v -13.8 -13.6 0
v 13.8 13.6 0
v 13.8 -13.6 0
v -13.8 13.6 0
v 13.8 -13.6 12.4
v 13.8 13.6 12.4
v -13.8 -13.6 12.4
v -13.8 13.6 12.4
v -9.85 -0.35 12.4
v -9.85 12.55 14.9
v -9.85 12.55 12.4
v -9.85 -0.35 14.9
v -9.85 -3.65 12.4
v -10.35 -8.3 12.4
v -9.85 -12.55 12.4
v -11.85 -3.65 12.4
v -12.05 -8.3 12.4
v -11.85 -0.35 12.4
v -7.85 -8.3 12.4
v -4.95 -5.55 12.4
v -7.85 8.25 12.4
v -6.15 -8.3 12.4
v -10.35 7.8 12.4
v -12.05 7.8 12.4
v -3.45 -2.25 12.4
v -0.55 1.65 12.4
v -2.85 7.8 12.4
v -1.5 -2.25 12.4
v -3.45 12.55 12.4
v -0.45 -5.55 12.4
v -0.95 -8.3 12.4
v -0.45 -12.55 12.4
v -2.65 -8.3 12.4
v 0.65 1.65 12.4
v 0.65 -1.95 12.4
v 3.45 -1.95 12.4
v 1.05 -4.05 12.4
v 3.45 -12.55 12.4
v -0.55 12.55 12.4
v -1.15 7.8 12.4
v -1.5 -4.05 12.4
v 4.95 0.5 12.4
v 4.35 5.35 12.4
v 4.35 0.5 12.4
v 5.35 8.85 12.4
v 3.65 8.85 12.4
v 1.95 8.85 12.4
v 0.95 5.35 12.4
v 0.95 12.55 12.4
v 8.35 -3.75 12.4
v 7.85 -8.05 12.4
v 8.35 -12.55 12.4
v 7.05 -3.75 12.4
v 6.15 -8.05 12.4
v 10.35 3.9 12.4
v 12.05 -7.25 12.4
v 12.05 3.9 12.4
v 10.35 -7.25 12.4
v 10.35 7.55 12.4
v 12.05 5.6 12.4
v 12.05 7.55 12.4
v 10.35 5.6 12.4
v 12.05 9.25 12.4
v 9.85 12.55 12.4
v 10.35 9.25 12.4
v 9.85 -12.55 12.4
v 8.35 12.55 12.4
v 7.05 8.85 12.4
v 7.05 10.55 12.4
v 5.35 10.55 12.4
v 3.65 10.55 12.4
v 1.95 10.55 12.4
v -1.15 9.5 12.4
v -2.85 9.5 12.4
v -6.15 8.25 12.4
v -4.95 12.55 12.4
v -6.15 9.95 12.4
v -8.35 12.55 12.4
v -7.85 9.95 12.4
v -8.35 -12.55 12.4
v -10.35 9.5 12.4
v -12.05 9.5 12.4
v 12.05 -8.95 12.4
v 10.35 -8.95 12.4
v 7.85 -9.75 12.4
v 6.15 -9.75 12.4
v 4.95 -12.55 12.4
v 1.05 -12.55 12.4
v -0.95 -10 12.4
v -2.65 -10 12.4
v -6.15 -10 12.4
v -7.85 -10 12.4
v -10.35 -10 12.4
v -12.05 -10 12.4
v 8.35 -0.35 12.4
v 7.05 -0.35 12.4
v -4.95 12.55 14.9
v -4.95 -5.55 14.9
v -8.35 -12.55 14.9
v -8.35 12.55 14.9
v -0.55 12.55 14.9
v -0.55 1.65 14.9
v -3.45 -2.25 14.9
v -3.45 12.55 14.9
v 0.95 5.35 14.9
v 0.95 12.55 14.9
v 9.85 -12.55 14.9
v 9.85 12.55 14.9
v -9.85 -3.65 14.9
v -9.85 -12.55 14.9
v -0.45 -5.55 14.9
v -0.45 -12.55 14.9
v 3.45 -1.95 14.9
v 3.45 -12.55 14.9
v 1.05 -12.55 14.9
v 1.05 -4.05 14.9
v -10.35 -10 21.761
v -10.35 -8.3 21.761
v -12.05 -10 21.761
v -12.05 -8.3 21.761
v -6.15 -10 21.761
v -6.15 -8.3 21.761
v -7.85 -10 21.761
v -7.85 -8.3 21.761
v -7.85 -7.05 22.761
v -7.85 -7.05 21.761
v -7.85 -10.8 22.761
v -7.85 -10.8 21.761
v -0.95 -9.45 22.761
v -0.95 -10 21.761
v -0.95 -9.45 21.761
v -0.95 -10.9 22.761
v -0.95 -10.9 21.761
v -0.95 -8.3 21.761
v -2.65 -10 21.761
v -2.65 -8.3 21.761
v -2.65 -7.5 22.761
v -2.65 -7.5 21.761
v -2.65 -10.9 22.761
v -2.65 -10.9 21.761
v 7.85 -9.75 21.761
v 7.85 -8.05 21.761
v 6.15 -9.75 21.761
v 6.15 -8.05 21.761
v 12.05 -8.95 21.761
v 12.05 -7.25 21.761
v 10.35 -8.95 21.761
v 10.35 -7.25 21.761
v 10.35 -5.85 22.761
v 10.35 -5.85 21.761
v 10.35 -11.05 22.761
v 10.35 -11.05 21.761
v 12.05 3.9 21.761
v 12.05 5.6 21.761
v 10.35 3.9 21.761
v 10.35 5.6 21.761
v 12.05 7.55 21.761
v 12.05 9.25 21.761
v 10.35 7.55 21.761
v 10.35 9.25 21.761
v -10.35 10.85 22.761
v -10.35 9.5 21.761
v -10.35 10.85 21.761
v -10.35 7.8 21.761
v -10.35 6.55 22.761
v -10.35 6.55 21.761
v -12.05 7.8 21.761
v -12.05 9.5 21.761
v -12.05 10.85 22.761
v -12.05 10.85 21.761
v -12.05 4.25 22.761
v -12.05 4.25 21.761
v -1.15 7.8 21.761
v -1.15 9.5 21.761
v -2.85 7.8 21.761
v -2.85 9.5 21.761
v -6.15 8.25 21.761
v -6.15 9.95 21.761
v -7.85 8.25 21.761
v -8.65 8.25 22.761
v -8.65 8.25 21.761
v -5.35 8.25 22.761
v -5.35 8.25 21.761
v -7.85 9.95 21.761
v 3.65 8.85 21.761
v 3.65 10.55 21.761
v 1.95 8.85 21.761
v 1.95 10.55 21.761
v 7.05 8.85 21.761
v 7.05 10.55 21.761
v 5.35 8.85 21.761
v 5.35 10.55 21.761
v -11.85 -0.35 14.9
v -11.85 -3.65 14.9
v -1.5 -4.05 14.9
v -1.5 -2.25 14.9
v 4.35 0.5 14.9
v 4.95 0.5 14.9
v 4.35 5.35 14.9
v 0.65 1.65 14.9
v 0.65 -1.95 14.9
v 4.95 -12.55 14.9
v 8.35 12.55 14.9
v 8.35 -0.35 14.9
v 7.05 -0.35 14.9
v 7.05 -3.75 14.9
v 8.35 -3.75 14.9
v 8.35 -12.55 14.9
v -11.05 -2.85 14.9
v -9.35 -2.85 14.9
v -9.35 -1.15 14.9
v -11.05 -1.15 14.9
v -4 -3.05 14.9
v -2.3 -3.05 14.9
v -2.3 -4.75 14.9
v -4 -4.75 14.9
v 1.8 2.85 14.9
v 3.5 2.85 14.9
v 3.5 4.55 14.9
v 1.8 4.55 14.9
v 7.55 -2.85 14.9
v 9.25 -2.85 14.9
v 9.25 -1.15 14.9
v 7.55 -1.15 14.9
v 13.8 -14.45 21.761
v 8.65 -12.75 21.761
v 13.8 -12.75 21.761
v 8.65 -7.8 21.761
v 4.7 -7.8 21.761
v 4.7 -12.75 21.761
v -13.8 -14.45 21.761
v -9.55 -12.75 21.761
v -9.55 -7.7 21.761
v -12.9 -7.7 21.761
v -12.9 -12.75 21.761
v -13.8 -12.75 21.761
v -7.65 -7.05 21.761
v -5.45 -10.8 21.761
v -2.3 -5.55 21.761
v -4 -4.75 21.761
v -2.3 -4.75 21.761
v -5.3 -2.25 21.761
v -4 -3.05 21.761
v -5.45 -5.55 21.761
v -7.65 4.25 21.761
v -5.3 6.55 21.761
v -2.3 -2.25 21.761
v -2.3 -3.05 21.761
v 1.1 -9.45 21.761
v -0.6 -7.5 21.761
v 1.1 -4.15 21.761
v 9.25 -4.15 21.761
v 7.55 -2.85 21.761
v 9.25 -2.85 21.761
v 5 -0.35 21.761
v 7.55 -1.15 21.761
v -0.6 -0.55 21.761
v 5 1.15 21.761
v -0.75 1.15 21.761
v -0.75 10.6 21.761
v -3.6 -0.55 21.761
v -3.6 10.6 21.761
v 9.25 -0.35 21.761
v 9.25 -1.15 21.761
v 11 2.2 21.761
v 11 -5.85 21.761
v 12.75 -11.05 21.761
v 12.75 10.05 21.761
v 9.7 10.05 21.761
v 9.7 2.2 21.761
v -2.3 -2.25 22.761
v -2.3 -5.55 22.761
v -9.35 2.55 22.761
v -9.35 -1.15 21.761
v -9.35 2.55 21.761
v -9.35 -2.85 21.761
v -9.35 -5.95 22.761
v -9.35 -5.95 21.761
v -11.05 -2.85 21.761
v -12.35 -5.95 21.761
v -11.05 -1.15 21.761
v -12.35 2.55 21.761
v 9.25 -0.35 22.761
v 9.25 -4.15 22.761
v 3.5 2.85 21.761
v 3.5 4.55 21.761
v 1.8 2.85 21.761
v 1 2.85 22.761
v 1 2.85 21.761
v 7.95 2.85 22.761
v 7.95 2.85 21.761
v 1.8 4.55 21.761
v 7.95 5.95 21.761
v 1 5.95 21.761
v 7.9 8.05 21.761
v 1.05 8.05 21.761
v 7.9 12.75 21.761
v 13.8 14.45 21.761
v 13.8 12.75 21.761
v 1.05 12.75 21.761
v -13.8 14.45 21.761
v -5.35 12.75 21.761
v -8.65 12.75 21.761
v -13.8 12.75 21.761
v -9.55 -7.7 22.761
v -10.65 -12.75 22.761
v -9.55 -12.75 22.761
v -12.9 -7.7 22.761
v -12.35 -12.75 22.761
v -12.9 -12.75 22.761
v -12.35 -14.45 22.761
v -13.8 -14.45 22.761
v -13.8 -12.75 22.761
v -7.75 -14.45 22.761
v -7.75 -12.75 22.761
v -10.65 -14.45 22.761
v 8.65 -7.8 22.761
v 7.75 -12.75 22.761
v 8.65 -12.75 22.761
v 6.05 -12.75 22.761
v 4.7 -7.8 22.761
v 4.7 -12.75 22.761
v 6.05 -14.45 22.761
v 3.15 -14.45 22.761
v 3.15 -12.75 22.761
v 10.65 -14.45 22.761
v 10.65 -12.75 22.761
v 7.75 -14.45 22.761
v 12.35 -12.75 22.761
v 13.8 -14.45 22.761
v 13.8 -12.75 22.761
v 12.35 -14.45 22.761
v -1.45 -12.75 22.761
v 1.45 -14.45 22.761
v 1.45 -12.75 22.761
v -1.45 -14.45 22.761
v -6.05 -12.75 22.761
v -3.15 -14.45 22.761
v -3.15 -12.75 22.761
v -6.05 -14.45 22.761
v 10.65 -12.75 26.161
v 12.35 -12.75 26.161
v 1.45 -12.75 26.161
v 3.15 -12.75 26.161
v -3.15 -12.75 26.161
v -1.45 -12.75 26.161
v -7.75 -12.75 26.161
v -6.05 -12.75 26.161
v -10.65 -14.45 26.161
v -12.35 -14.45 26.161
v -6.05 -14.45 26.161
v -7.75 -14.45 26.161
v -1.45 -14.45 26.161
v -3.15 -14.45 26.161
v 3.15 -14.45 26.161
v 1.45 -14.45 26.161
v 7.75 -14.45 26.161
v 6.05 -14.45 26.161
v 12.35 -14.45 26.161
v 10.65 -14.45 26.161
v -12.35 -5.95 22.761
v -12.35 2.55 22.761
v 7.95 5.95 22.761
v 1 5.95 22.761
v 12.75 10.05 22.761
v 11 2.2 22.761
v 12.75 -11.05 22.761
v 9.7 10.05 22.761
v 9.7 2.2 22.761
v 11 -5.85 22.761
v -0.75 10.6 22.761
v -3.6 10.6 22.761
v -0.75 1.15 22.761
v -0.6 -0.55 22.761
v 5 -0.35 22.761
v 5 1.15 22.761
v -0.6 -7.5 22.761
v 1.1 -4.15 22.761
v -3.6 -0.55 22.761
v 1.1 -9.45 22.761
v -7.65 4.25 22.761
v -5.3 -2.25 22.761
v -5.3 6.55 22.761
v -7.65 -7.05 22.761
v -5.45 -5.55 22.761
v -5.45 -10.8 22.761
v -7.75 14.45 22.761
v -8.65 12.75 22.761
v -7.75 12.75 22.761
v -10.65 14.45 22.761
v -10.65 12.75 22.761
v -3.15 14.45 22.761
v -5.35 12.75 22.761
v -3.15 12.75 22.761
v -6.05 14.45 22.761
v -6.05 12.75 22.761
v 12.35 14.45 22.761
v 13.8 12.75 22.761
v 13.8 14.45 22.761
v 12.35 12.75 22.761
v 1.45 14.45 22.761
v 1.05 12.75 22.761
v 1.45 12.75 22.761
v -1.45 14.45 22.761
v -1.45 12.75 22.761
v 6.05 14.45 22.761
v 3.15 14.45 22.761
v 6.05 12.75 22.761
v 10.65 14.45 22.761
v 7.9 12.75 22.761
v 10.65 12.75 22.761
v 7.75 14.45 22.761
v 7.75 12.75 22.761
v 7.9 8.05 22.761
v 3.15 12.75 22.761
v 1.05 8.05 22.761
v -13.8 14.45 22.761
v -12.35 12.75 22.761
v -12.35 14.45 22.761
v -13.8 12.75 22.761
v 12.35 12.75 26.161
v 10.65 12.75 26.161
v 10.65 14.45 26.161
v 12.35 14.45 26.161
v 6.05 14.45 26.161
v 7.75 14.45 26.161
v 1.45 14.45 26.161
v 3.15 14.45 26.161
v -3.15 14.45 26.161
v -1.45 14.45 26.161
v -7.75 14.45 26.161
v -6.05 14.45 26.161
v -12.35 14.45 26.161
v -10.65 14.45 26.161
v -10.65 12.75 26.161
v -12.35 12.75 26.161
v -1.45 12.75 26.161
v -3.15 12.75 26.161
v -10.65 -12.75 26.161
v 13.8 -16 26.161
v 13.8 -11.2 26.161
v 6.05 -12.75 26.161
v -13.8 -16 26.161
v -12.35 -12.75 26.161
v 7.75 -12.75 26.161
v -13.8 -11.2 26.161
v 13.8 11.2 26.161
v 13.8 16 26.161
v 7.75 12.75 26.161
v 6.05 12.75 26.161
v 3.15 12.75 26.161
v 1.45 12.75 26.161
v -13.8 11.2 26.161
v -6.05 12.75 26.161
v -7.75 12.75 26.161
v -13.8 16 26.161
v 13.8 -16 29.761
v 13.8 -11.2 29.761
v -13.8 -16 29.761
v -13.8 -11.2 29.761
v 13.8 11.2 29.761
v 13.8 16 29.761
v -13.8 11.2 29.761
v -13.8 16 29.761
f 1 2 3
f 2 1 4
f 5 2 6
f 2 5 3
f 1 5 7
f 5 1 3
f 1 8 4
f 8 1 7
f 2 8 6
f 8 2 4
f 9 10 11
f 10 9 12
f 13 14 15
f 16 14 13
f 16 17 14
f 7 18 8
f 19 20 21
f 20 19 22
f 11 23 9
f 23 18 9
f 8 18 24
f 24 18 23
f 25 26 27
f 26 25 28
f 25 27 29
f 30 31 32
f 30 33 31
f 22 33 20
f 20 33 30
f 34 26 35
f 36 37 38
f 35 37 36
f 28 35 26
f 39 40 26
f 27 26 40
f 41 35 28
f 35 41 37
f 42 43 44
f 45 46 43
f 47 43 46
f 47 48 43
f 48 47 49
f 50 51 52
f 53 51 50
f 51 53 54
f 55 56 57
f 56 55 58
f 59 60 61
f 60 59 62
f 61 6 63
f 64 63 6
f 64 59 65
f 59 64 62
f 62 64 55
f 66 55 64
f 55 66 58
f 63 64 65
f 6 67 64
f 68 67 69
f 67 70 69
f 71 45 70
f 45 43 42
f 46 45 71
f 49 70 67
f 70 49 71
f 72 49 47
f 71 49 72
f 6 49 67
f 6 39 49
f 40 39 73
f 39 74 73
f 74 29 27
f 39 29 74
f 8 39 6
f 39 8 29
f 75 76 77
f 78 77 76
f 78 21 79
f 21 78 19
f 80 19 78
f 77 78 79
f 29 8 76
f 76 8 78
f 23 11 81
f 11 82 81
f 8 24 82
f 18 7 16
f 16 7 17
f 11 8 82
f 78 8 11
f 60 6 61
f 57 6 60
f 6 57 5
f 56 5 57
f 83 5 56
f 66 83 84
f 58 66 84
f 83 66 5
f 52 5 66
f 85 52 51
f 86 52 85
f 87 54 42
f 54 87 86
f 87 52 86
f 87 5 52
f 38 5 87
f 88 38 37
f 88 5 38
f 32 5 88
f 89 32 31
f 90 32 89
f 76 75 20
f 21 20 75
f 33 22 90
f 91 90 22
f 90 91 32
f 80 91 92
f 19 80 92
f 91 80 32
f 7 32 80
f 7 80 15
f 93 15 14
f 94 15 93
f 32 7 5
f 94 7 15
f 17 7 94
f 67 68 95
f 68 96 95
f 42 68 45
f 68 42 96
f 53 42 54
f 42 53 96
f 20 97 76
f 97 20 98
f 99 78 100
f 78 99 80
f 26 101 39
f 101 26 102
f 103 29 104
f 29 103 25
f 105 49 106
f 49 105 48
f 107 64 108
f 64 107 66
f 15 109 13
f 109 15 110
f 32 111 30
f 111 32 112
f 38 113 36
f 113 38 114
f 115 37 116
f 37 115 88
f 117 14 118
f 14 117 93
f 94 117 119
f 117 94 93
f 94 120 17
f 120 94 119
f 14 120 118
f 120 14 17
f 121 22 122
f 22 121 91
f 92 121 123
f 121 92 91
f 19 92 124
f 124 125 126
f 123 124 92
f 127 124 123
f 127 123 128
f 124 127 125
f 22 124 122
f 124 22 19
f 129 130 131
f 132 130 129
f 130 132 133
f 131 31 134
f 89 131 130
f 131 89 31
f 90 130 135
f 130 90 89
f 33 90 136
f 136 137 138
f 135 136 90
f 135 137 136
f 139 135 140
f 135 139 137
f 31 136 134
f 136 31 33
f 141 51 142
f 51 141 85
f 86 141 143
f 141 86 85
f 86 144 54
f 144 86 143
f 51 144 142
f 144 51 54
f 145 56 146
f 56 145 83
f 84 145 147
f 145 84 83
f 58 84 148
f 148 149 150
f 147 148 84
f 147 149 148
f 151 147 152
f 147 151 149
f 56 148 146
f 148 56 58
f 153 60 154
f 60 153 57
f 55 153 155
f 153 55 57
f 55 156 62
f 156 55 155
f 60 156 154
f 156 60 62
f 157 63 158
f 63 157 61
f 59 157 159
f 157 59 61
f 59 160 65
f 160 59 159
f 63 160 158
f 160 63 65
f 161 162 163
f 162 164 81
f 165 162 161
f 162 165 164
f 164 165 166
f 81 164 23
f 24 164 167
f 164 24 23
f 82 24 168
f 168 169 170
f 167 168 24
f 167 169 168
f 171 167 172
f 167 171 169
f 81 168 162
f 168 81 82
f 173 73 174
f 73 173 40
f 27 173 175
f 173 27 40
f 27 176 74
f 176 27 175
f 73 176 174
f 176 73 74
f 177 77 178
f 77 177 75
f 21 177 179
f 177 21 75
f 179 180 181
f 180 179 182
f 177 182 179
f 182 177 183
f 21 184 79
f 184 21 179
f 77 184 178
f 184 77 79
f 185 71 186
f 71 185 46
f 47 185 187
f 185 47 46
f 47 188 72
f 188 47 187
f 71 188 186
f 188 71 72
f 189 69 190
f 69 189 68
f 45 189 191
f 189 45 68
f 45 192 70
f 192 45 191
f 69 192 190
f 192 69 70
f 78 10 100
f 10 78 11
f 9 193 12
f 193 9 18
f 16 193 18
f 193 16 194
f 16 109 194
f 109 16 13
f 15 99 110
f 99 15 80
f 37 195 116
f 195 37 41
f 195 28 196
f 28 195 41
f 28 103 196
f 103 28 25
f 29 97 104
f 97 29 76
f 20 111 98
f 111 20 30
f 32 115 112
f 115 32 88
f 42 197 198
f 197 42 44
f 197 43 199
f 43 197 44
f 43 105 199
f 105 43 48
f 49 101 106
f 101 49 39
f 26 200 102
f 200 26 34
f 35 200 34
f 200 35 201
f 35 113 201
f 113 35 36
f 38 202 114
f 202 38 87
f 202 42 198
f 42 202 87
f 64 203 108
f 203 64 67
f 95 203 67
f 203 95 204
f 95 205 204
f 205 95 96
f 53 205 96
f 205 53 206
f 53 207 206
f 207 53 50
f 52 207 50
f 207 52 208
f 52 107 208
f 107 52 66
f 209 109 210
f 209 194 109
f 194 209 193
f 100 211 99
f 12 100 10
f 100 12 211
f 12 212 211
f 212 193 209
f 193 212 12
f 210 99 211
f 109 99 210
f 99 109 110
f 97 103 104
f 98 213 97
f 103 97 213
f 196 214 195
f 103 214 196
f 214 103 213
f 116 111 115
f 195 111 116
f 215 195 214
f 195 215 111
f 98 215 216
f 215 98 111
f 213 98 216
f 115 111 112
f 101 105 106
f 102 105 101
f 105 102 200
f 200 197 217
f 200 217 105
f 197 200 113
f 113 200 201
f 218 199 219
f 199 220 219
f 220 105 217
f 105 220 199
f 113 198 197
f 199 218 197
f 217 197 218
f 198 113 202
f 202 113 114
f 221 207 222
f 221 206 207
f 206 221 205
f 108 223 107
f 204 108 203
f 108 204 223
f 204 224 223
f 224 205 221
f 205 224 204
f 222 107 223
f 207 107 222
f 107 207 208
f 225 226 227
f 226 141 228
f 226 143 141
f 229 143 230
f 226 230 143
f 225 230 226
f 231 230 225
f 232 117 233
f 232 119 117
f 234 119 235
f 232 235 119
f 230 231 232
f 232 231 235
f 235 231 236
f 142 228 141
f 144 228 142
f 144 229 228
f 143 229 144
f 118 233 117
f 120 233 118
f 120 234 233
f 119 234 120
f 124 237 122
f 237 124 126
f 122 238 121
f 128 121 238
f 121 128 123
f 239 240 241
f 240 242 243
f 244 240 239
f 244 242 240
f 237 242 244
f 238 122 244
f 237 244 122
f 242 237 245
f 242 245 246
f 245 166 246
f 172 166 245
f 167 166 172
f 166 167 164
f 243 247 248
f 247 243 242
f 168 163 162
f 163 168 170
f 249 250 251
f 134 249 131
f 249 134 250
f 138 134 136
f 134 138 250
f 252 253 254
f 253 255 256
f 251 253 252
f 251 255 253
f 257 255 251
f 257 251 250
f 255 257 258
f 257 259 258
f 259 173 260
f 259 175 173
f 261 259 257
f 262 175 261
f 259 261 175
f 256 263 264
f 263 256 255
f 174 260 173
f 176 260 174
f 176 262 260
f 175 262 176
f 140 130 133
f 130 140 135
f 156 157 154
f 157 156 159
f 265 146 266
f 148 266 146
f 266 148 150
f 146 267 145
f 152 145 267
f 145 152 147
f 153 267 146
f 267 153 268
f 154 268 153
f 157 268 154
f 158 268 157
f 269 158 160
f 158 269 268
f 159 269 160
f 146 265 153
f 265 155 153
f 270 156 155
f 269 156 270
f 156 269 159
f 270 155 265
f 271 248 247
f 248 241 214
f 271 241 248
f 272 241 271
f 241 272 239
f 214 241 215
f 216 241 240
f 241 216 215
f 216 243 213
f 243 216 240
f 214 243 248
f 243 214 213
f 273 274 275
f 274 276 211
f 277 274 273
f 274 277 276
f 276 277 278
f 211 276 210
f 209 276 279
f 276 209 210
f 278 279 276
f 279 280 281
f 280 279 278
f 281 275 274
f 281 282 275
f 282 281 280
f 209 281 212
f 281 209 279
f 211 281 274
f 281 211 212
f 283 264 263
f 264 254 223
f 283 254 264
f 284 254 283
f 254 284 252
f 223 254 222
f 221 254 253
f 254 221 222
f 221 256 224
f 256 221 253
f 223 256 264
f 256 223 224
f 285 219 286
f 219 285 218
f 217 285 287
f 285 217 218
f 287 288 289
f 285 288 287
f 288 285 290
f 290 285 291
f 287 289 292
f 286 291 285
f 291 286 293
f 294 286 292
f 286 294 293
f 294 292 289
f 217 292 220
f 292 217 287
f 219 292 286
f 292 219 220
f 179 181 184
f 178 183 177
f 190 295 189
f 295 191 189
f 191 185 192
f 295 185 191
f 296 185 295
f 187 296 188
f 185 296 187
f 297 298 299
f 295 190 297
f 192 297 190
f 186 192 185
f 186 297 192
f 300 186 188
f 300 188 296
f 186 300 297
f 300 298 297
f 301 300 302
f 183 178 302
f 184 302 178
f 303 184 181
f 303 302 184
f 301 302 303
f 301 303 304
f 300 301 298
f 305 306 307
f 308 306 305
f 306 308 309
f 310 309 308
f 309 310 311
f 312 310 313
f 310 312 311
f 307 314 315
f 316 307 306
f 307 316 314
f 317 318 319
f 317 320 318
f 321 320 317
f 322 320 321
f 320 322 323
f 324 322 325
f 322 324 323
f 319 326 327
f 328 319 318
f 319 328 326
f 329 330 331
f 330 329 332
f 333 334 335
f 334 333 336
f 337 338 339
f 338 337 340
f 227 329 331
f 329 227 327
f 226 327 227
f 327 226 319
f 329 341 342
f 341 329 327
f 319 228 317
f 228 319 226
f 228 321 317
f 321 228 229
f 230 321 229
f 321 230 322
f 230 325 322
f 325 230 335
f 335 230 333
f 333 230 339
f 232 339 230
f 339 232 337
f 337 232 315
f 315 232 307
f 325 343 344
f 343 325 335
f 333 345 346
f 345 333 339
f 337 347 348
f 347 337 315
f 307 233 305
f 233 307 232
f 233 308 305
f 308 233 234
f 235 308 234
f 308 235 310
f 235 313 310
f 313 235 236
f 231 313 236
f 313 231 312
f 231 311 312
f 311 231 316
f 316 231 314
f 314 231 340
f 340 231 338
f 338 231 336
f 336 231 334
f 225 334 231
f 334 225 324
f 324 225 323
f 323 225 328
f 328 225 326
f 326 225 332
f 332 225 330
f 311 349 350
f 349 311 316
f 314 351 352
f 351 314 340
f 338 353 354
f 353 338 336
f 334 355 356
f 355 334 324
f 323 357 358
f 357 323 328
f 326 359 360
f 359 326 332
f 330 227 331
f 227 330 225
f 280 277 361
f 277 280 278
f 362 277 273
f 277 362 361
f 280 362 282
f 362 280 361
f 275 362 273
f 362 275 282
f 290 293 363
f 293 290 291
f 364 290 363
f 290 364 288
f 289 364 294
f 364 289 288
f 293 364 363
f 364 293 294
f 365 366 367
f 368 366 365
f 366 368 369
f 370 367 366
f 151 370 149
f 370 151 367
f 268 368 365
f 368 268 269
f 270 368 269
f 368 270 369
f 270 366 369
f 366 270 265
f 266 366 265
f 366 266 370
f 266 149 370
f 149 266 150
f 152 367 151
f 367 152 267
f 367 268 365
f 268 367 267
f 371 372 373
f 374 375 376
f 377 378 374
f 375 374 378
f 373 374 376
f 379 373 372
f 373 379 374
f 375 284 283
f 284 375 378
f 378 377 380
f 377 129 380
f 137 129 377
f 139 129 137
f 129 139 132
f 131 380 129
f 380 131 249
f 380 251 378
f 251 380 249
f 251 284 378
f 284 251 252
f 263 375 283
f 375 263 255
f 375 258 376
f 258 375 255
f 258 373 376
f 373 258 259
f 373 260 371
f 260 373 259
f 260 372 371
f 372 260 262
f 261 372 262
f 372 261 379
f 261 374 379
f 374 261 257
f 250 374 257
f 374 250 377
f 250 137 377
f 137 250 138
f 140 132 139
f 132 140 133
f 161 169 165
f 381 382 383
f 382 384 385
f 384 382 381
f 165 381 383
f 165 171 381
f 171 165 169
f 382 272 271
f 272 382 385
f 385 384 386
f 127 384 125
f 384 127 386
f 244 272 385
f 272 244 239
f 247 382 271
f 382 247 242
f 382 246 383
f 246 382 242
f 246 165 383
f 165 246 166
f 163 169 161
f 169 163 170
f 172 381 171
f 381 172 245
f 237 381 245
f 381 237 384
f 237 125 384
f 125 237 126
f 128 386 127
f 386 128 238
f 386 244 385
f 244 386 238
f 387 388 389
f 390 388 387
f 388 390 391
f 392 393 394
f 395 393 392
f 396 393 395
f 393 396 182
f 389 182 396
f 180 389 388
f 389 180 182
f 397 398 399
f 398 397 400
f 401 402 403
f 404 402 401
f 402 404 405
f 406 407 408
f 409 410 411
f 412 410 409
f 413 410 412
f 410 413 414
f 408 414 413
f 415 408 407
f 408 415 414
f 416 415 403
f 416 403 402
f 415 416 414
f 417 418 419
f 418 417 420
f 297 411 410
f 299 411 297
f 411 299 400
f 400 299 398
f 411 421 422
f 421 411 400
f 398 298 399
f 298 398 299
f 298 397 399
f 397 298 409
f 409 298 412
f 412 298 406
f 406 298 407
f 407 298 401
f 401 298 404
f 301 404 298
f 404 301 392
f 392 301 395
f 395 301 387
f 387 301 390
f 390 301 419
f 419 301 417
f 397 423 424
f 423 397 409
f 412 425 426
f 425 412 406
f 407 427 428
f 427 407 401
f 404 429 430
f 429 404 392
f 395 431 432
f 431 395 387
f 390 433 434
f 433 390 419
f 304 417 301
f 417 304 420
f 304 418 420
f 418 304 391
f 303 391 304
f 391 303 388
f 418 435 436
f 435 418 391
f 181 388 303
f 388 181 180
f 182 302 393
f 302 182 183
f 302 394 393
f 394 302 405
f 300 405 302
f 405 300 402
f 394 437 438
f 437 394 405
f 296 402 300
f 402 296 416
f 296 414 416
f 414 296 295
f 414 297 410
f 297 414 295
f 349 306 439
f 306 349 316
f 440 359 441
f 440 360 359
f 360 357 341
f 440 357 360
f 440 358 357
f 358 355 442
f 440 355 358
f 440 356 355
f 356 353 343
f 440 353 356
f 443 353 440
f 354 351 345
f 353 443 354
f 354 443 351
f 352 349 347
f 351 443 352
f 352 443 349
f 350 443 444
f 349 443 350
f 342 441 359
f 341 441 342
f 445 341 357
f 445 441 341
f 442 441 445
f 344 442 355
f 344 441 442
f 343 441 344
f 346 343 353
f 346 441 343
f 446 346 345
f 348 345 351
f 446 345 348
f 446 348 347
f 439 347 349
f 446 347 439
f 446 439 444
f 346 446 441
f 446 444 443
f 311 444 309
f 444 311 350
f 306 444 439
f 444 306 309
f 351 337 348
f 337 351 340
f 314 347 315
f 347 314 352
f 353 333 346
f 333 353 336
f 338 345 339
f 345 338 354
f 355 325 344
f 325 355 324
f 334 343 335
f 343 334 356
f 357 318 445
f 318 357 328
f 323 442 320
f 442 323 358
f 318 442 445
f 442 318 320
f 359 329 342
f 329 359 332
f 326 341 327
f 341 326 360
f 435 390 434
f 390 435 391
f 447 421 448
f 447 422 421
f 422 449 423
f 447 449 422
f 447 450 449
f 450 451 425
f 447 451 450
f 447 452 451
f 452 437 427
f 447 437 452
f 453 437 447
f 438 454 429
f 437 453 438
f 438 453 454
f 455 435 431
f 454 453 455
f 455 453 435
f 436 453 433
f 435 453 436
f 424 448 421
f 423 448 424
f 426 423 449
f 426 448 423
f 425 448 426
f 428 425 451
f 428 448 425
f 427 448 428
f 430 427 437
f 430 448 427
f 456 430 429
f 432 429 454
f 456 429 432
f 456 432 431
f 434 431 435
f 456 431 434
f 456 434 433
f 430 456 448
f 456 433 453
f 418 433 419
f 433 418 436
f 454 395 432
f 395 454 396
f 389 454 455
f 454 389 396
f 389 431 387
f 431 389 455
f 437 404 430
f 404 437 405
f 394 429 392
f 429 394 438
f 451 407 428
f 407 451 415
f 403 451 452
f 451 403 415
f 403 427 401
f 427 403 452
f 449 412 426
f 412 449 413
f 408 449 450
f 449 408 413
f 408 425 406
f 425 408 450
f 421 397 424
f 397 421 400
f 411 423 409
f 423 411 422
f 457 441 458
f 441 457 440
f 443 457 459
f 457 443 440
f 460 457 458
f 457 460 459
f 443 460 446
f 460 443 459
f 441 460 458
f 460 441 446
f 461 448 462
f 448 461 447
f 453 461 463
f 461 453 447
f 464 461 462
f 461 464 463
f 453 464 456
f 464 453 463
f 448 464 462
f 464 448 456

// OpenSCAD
// Generated by SolidPython 0.4.2 on 2020-09-29 23:21:07
//!OpenSCAD

scale(v = 0.0100000000) {
	translate(v = [-1380, -1360, 0]) {
		union() {
			color(c = [0.4000000000, 0.4000000000, 0.4000000000]) {
				translate(v = [0, 0, 0]) {
					linear_extrude(height = 1000.0000000000) {
						polygon(paths = [[0, 1, 2, 3]], points = [[0, 0], [0, 2720], [2760, 2720], [2760, 0]]);
					}
				}
			}
			color(c = [0.2000000000, 0.6000000000, 0.2000000000]) {
				translate(v = [0, 0, 1000.0000000000]) {
					linear_extrude(height = 120.0000000000) {
						polygon(paths = [[0, 1, 2, 3]], points = [[0, 1305], [0, 2720], [2760, 2720], [2760, 1305]]);
					}
				}
			}
			color(c = [0.4000000000, 0.4000000000, 0.4000000000]) {
				translate(v = [0, 0, 1000.0000000000]) {
					linear_extrude(height = 120.0000000000) {
						polygon(paths = [[0, 1, 2, 3]], points = [[0, 0], [0, 1305], [2760, 1305], [2760, 0]]);
					}
				}
			}
			color(c = [0.9000000000, 0.6000000000, 0.6000000000]) {
				translate(v = [0, 0, 1120.0000000000]) {
					linear_extrude(height = 120.0000000000) {
						polygon(paths = [[0, 1, 2, 3]], points = [[135, 2065], [135, 2485], [395, 2485], [395, 2065]]);
					}
				}
			}
			color(c = [0.9000000000, 0.6000000000, 0.6000000000]) {
				translate(v = [0, 0, 1120.0000000000]) {
					linear_extrude(height = 120.0000000000) {
						polygon(paths = [[0, 1, 2, 3]], points = [[545, 2065], [545, 2485], [885, 2485], [885, 2065]]);
					}
				}
			}
			color(c = [0.9000000000, 0.6000000000, 0.6000000000]) {
				translate(v = [0, 0, 1120.0000000000]) {
					linear_extrude(height = 120.0000000000) {
						polygon(paths = [[0, 1, 2, 3]], points = [[1035, 2065], [1035, 2485], [1325, 2485], [1325, 2065]]);
					}
				}
			}
			color(c = [0.9000000000, 0.6000000000, 0.6000000000]) {
				translate(v = [0, 0, 1120.0000000000]) {
					linear_extrude(height = 120.0000000000) {
						polygon(paths = [[0, 1, 2, 3, 4, 5]], points = [[1965, 1485], [1965, 2065], [1475, 2065], [1475, 2485], [2215, 2485], [2215, 1485]]);
					}
				}
			}
			color(c = [0.9000000000, 0.6000000000, 0.6000000000]) {
				translate(v = [0, 0, 1120.0000000000]) {
					linear_extrude(height = 120.0000000000) {
						polygon(paths = [[0, 1, 2, 3]], points = [[2365, 1485], [2365, 2485], [2625, 2485], [2625, 1485]]);
					}
				}
			}
			color(c = [0.9000000000, 0.6000000000, 0.9000000000]) {
				translate(v = [0, 0, 1120.0000000000]) {
					linear_extrude(height = 120.0000000000) {
						polygon(paths = [[0, 1, 2, 3]], points = [[135, 235], [135, 655], [395, 655], [395, 235]]);
					}
				}
			}
			color(c = [0.9000000000, 0.6000000000, 0.9000000000]) {
				translate(v = [0, 0, 1120.0000000000]) {
					linear_extrude(height = 120.0000000000) {
						polygon(paths = [[0, 1, 2, 3]], points = [[545, 235], [545, 655], [805, 655], [805, 235]]);
					}
				}
			}
			color(c = [0.9000000000, 0.6000000000, 0.9000000000]) {
				translate(v = [0, 0, 1120.0000000000]) {
					linear_extrude(height = 120.0000000000) {
						polygon(paths = [[0, 1, 2, 3]], points = [[1075, 235], [1075, 655], [1335, 655], [1335, 235]]);
					}
				}
			}
			color(c = [0.9000000000, 0.6000000000, 0.9000000000]) {
				translate(v = [0, 0, 1120.0000000000]) {
					linear_extrude(height = 120.0000000000) {
						polygon(paths = [[0, 1, 2, 3]], points = [[1485, 235], [1485, 655], [1725, 655], [1725, 235]]);
					}
				}
			}
			color(c = [0.9000000000, 0.6000000000, 0.9000000000]) {
				translate(v = [0, 0, 1120.0000000000]) {
					linear_extrude(height = 120.0000000000) {
						polygon(paths = [[0, 1, 2, 3, 4, 5]], points = [[1875, 235], [1875, 655], [1955, 655], [1955, 885], [2215, 885], [2215, 235]]);
					}
				}
			}
			color(c = [0.9000000000, 0.6000000000, 0.9000000000]) {
				translate(v = [0, 0, 1120.0000000000]) {
					linear_extrude(height = 120.0000000000) {
						polygon(paths = [[0, 1, 2, 3]], points = [[2365, 235], [2365, 885], [2625, 885], [2625, 235]]);
					}
				}
			}
			color(c = [0.2000000000, 0.6000000000, 0.2000000000]) {
				translate(v = [0, 0, 1120.0000000000]) {
					linear_extrude(height = 120.0000000000) {
						difference() {
							polygon(paths = [[0, 1, 2, 3]], points = [[0, 1305], [0, 2720], [2760, 2720], [2760, 1305]]);
							polygon(paths = [[0, 1, 2, 3]], points = [[2365, 1485], [2625, 1485], [2625, 2485], [2365, 2485]]);
							polygon(paths = [[0, 1, 2, 3]], points = [[135, 2065], [395, 2065], [395, 2485], [135, 2485]]);
							polygon(paths = [[0, 1, 2, 3]], points = [[545, 2065], [885, 2065], [885, 2485], [545, 2485]]);
							polygon(paths = [[0, 1, 2, 3]], points = [[1035, 2065], [1325, 2065], [1325, 2485], [1035, 2485]]);
							polygon(paths = [[0, 1, 2, 3, 4, 5]], points = [[1965, 1485], [2215, 1485], [2215, 2485], [1475, 2485], [1475, 2065], [1965, 2065]]);
						}
					}
				}
			}
			color(c = [0.4000000000, 0.4000000000, 0.4000000000]) {
				translate(v = [0, 0, 1120.0000000000]) {
					linear_extrude(height = 120.0000000000) {
						difference() {
							polygon(paths = [[0, 1, 2, 3]], points = [[0, 0], [0, 1305], [2760, 1305], [2760, 0]]);
							polygon(paths = [[0, 1, 2, 3]], points = [[135, 235], [395, 235], [395, 655], [135, 655]]);
							polygon(paths = [[0, 1, 2, 3]], points = [[545, 235], [805, 235], [805, 655], [545, 655]]);
							polygon(paths = [[0, 1, 2, 3]], points = [[1075, 235], [1335, 235], [1335, 655], [1075, 655]]);
							polygon(paths = [[0, 1, 2, 3]], points = [[1485, 235], [1725, 235], [1725, 655], [1485, 655]]);
							polygon(paths = [[0, 1, 2, 3]], points = [[2365, 235], [2625, 235], [2625, 885], [2365, 885]]);
							polygon(paths = [[0, 1, 2, 3, 4, 5]], points = [[1875, 235], [2215, 235], [2215, 885], [1955, 885], [1955, 655], [1875, 655]]);
						}
					}
				}
			}
			color(c = [0.1000000000, 0.1000000000, 0.1000000000]) {
				translate(v = [0, 0, 1240.0000000000]) {
					linear_extrude(height = 70.0000000000) {
						polygon(paths = [[0, 1, 2, 3]], points = [[175, 360], [175, 530], [345, 530], [345, 360]]);
					}
				}
			}
			color(c = [0.1000000000, 0.1000000000, 0.1000000000]) {
				translate(v = [0, 0, 1240.0000000000]) {
					linear_extrude(height = 70.0000000000) {
						polygon(paths = [[0, 1, 2, 3]], points = [[595, 360], [595, 530], [765, 530], [765, 360]]);
					}
				}
			}
			color(c = [0.1000000000, 0.1000000000, 0.1000000000]) {
				translate(v = [0, 0, 1240.0000000000]) {
					linear_extrude(height = 70.0000000000) {
						polygon(paths = [[0, 1, 2, 3]], points = [[1115, 360], [1115, 530], [1285, 530], [1285, 360]]);
					}
				}
			}
			color(c = [0.1000000000, 0.1000000000, 0.1000000000]) {
				translate(v = [0, 0, 1240.0000000000]) {
					linear_extrude(height = 70.0000000000) {
						polygon(paths = [[0, 1, 2, 3]], points = [[1995, 385], [1995, 555], [2165, 555], [2165, 385]]);
					}
				}
			}
			color(c = [0.1000000000, 0.1000000000, 0.1000000000]) {
				translate(v = [0, 0, 1240.0000000000]) {
					linear_extrude(height = 70.0000000000) {
						polygon(paths = [[0, 1, 2, 3]], points = [[2415, 465], [2415, 635], [2585, 635], [2585, 465]]);
					}
				}
			}
			color(c = [0.1000000000, 0.1000000000, 0.1000000000]) {
				translate(v = [0, 0, 1240.0000000000]) {
					linear_extrude(height = 70.0000000000) {
						polygon(paths = [[0, 1, 2, 3]], points = [[2415, 1750], [2415, 1920], [2585, 1920], [2585, 1750]]);
					}
				}
			}
			color(c = [0.1000000000, 0.1000000000, 0.1000000000]) {
				translate(v = [0, 0, 1240.0000000000]) {
					linear_extrude(height = 70.0000000000) {
						polygon(paths = [[0, 1, 2, 3]], points = [[2415, 2115], [2415, 2285], [2585, 2285], [2585, 2115]]);
					}
				}
			}
			color(c = [0.1000000000, 0.1000000000, 0.1000000000]) {
				translate(v = [0, 0, 1240.0000000000]) {
					linear_extrude(height = 70.0000000000) {
						polygon(paths = [[0, 1, 2, 3]], points = [[175, 2140], [175, 2310], [345, 2310], [345, 2140]]);
					}
				}
			}
			color(c = [0.1000000000, 0.1000000000, 0.1000000000]) {
				translate(v = [0, 0, 1240.0000000000]) {
					linear_extrude(height = 70.0000000000) {
						polygon(paths = [[0, 1, 2, 3]], points = [[1095, 2140], [1095, 2310], [1265, 2310], [1265, 2140]]);
					}
				}
			}
			color(c = [0.1000000000, 0.1000000000, 0.1000000000]) {
				translate(v = [0, 0, 1240.0000000000]) {
					linear_extrude(height = 70.0000000000) {
						polygon(paths = [[0, 1, 2, 3]], points = [[595, 2185], [595, 2355], [765, 2355], [765, 2185]]);
					}
				}
			}
			color(c = [0.1000000000, 0.1000000000, 0.1000000000]) {
				translate(v = [0, 0, 1240.0000000000]) {
					linear_extrude(height = 70.0000000000) {
						polygon(paths = [[0, 1, 2, 3]], points = [[1575, 2245], [1575, 2415], [1745, 2415], [1745, 2245]]);
					}
				}
			}
			color(c = [0.1000000000, 0.1000000000, 0.1000000000]) {
				translate(v = [0, 0, 1240.0000000000]) {
					linear_extrude(height = 70.0000000000) {
						polygon(paths = [[0, 1, 2, 3]], points = [[1915, 2245], [1915, 2415], [2085, 2415], [2085, 2245]]);
					}
				}
			}
			color(c = [1.0000000000, 1.0000000000, 1.0000000000]) {
				translate(v = [0, 0, 1240.0000000000]) {
					linear_extrude(height = 70.0000000000) {
						polygon(paths = [[0, 1, 2, 3, 4, 5, 6, 7]], points = [[395, 105], [395, 995], [195, 995], [195, 1325], [395, 1325], [395, 2615], [545, 2615], [545, 105]]);
					}
				}
			}
			color(c = [1.0000000000, 1.0000000000, 1.0000000000]) {
				translate(v = [0, 0, 1240.0000000000]) {
					linear_extrude(height = 70.0000000000) {
						polygon(paths = [[0, 1, 2, 3, 4, 5, 6, 7, 8, 9]], points = [[1335, 105], [1335, 805], [885, 805], [885, 2615], [1035, 2615], [1035, 1135], [1230, 1135], [1230, 955], [1485, 955], [1485, 105]]);
					}
				}
			}
			color(c = [1.0000000000, 1.0000000000, 1.0000000000]) {
				translate(v = [0, 0, 1240.0000000000]) {
					linear_extrude(height = 70.0000000000) {
						polygon(paths = [[0, 1, 2, 3, 4, 5, 6, 7, 8, 9, 10, 11]], points = [[1725, 105], [1725, 1165], [1445, 1165], [1445, 1525], [1325, 1525], [1325, 2615], [1475, 2615], [1475, 1895], [1815, 1895], [1815, 1410], [1875, 1410], [1875, 105]]);
					}
				}
			}
			color(c = [1.0000000000, 1.0000000000, 1.0000000000]) {
				translate(v = [0, 0, 1240.0000000000]) {
					linear_extrude(height = 70.0000000000) {
						polygon(paths = [[0, 1, 2, 3, 4, 5, 6, 7]], points = [[2215, 105], [2215, 985], [2085, 985], [2085, 1325], [2215, 1325], [2215, 2615], [2365, 2615], [2365, 105]]);
					}
				}
			}
			color(c = [0.1000000000, 0.1000000000, 0.1000000000]) {
				translate(v = [0, 0, 1310.0000000000]) {
					linear_extrude(height = 180.0000000000) {
						polygon(paths = [[0, 1, 2, 3]], points = [[175, 360], [175, 530], [345, 530], [345, 360]]);
					}
				}
			}
			color(c = [0.1000000000, 0.1000000000, 0.1000000000]) {
				translate(v = [0, 0, 1310.0000000000]) {
					linear_extrude(height = 180.0000000000) {
						polygon(paths = [[0, 1, 2, 3]], points = [[595, 360], [595, 530], [765, 530], [765, 360]]);
					}
				}
			}
			color(c = [0.1000000000, 0.1000000000, 0.1000000000]) {
				translate(v = [0, 0, 1310.0000000000]) {
					linear_extrude(height = 180.0000000000) {
						polygon(paths = [[0, 1, 2, 3]], points = [[1115, 360], [1115, 530], [1285, 530], [1285, 360]]);
					}
				}
			}
			color(c = [0.1000000000, 0.1000000000, 0.1000000000]) {
				translate(v = [0, 0, 1310.0000000000]) {
					linear_extrude(height = 180.0000000000) {
						polygon(paths = [[0, 1, 2, 3]], points = [[1995, 385], [1995, 555], [2165, 555], [2165, 385]]);
					}
				}
			}
			color(c = [0.1000000000, 0.1000000000, 0.1000000000]) {
				translate(v = [0, 0, 1310.0000000000]) {
					linear_extrude(height = 180.0000000000) {
						polygon(paths = [[0, 1, 2, 3]], points = [[2415, 465], [2415, 635], [2585, 635], [2585, 465]]);
					}
				}
			}
			color(c = [0.1000000000, 0.1000000000, 0.1000000000]) {
				translate(v = [0, 0, 1310.0000000000]) {
					linear_extrude(height = 180.0000000000) {
						polygon(paths = [[0, 1, 2, 3]], points = [[2415, 1750], [2415, 1920], [2585, 1920], [2585, 1750]]);
					}
				}
			}
			color(c = [0.1000000000, 0.1000000000, 0.1000000000]) {
				translate(v = [0, 0, 1310.0000000000]) {
					linear_extrude(height = 180.0000000000) {
						polygon(paths = [[0, 1, 2, 3]], points = [[2415, 2115], [2415, 2285], [2585, 2285], [2585, 2115]]);
					}
				}
			}
			color(c = [0.1000000000, 0.1000000000, 0.1000000000]) {
				translate(v = [0, 0, 1310.0000000000]) {
					linear_extrude(height = 180.0000000000) {
						polygon(paths = [[0, 1, 2, 3]], points = [[175, 2140], [175, 2310], [345, 2310], [345, 2140]]);
					}
				}
			}
			color(c = [0.1000000000, 0.1000000000, 0.1000000000]) {
				translate(v = [0, 0, 1310.0000000000]) {
					linear_extrude(height = 180.0000000000) {
						polygon(paths = [[0, 1, 2, 3]], points = [[1095, 2140], [1095, 2310], [1265, 2310], [1265, 2140]]);
					}
				}
			}
			color(c = [0.1000000000, 0.1000000000, 0.1000000000]) {
				translate(v = [0, 0, 1310.0000000000]) {
					linear_extrude(height = 180.0000000000) {
						polygon(paths = [[0, 1, 2, 3]], points = [[595, 2185], [595, 2355], [765, 2355], [765, 2185]]);
					}
				}
			}
			color(c = [0.1000000000, 0.1000000000, 0.1000000000]) {
				translate(v = [0, 0, 1310.0000000000]) {
					linear_extrude(height = 180.0000000000) {
						polygon(paths = [[0, 1, 2, 3]], points = [[1575, 2245], [1575, 2415], [1745, 2415], [1745, 2245]]);
					}
				}
			}
			color(c = [0.1000000000, 0.1000000000, 0.1000000000]) {
				translate(v = [0, 0, 1310.0000000000]) {
					linear_extrude(height = 180.0000000000) {
						polygon(paths = [[0, 1, 2, 3]], points = [[1915, 2245], [1915, 2415], [2085, 2415], [2085, 2245]]);
					}
				}
			}
			color(c = [0.7000000000, 0, 0]) {
				translate(v = [0, 0, 1310.0000000000]) {
					linear_extrude(height = 180.0000000000) {
						polygon(paths = [[0, 1, 2, 3, 4, 5, 6, 7]], points = [[395, 105], [395, 995], [195, 995], [195, 1325], [395, 1325], [395, 2615], [545, 2615], [545, 105]]);
					}
				}
			}
			color(c = [0.7000000000, 0, 0]) {
				translate(v = [0, 0, 1310.0000000000]) {
					linear_extrude(height = 180.0000000000) {
						polygon(paths = [[0, 1, 2, 3, 4, 5, 6, 7, 8, 9]], points = [[1335, 105], [1335, 805], [885, 805], [885, 2615], [1035, 2615], [1035, 1135], [1230, 1135], [1230, 955], [1485, 955], [1485, 105]]);
					}
				}
			}
			color(c = [0.7000000000, 0, 0]) {
				translate(v = [0, 0, 1310.0000000000]) {
					linear_extrude(height = 180.0000000000) {
						polygon(paths = [[0, 1, 2, 3, 4, 5, 6, 7, 8, 9, 10, 11]], points = [[1725, 105], [1725, 1165], [1445, 1165], [1445, 1525], [1325, 1525], [1325, 2615], [1475, 2615], [1475, 1895], [1815, 1895], [1815, 1410], [1875, 1410], [1875, 105]]);
					}
				}
			}
			color(c = [0.7000000000, 0, 0]) {
				translate(v = [0, 0, 1310.0000000000]) {
					linear_extrude(height = 180.0000000000) {
						polygon(paths = [[0, 1, 2, 3, 4, 5, 6, 7]], points = [[2215, 105], [2215, 985], [2085, 985], [2085, 1325], [2215, 1325], [2215, 2615], [2365, 2615], [2365, 105]]);
					}
				}
			}
			color(c = [0.1000000000, 0.1000000000, 0.1000000000]) {
				translate(v = [0, 0, 1490.0000000000]) {
					linear_extrude(height = 686.1000000000) {
						polygon(paths = [[0, 1, 2, 3]], points = [[175, 360], [175, 530], [345, 530], [345, 360]]);
					}
				}
			}
			color(c = [0.1000000000, 0.1000000000, 0.1000000000]) {
				translate(v = [0, 0, 1490.0000000000]) {
					linear_extrude(height = 686.1000000000) {
						polygon(paths = [[0, 1, 2, 3]], points = [[595, 360], [595, 530], [765, 530], [765, 360]]);
					}
				}
			}
			color(c = [0.1000000000, 0.1000000000, 0.1000000000]) {
				translate(v = [0, 0, 1490.0000000000]) {
					linear_extrude(height = 686.1000000000) {
						polygon(paths = [[0, 1, 2, 3]], points = [[1115, 360], [1115, 530], [1285, 530], [1285, 360]]);
					}
				}
			}
			color(c = [0.1000000000, 0.1000000000, 0.1000000000]) {
				translate(v = [0, 0, 1490.0000000000]) {
					linear_extrude(height = 686.1000000000) {
						polygon(paths = [[0, 1, 2, 3]], points = [[1995, 385], [1995, 555], [2165, 555], [2165, 385]]);
					}
				}
			}
			color(c = [0.1000000000, 0.1000000000, 0.1000000000]) {
				translate(v = [0, 0, 1490.0000000000]) {
					linear_extrude(height = 686.1000000000) {
						polygon(paths = [[0, 1, 2, 3]], points = [[2415, 465], [2415, 635], [2585, 635], [2585, 465]]);
					}
				}
			}
			color(c = [0.1000000000, 0.1000000000, 0.1000000000]) {
				translate(v = [0, 0, 1490.0000000000]) {
					linear_extrude(height = 686.1000000000) {
						polygon(paths = [[0, 1, 2, 3]], points = [[980, 885], [980, 1055], [1150, 1055], [1150, 885]]);
					}
				}
			}
			color(c = [0.1000000000, 0.1000000000, 0.1000000000]) {
				translate(v = [0, 0, 1490.0000000000]) {
					linear_extrude(height = 686.1000000000) {
						polygon(paths = [[0, 1, 2, 3]], points = [[275, 1075], [275, 1245], [445, 1245], [445, 1075]]);
					}
				}
			}
			color(c = [0.1000000000, 0.1000000000, 0.1000000000]) {
				translate(v = [0, 0, 1490.0000000000]) {
					linear_extrude(height = 686.1000000000) {
						polygon(paths = [[0, 1, 2, 3]], points = [[2135, 1075], [2135, 1245], [2305, 1245], [2305, 1075]]);
					}
				}
			}
			color(c = [0.1000000000, 0.1000000000, 0.1000000000]) {
				translate(v = [0, 0, 1490.0000000000]) {
					linear_extrude(height = 686.1000000000) {
						polygon(paths = [[0, 1, 2, 3]], points = [[1560, 1645], [1560, 1815], [1730, 1815], [1730, 1645]]);
					}
				}
			}
			color(c = [0.1000000000, 0.1000000000, 0.1000000000]) {
				translate(v = [0, 0, 1490.0000000000]) {
					linear_extrude(height = 686.1000000000) {
						polygon(paths = [[0, 1, 2, 3]], points = [[2415, 1750], [2415, 1920], [2585, 1920], [2585, 1750]]);
					}
				}
			}
			color(c = [0.1000000000, 0.1000000000, 0.1000000000]) {
				translate(v = [0, 0, 1490.0000000000]) {
					linear_extrude(height = 686.1000000000) {
						polygon(paths = [[0, 1, 2, 3]], points = [[2415, 2115], [2415, 2285], [2585, 2285], [2585, 2115]]);
					}
				}
			}
			color(c = [0.1000000000, 0.1000000000, 0.1000000000]) {
				translate(v = [0, 0, 1490.0000000000]) {
					linear_extrude(height = 686.1000000000) {
						polygon(paths = [[0, 1, 2, 3]], points = [[175, 2140], [175, 2310], [345, 2310], [345, 2140]]);
					}
				}
			}
			color(c = [0.1000000000, 0.1000000000, 0.1000000000]) {
				translate(v = [0, 0, 1490.0000000000]) {
					linear_extrude(height = 686.1000000000) {
						polygon(paths = [[0, 1, 2, 3]], points = [[1095, 2140], [1095, 2310], [1265, 2310], [1265, 2140]]);
					}
				}
			}
			color(c = [0.1000000000, 0.1000000000, 0.1000000000]) {
				translate(v = [0, 0, 1490.0000000000]) {
					linear_extrude(height = 686.1000000000) {
						polygon(paths = [[0, 1, 2, 3]], points = [[595, 2185], [595, 2355], [765, 2355], [765, 2185]]);
					}
				}
			}
			color(c = [0.1000000000, 0.1000000000, 0.1000000000]) {
				translate(v = [0, 0, 1490.0000000000]) {
					linear_extrude(height = 686.1000000000) {
						polygon(paths = [[0, 1, 2, 3]], points = [[1575, 2245], [1575, 2415], [1745, 2415], [1745, 2245]]);
					}
				}
			}
			color(c = [0.1000000000, 0.1000000000, 0.1000000000]) {
				translate(v = [0, 0, 1490.0000000000]) {
					linear_extrude(height = 686.1000000000) {
						polygon(paths = [[0, 1, 2, 3]], points = [[1915, 2245], [1915, 2415], [2085, 2415], [2085, 2245]]);
					}
				}
			}
			color(c = [0.9000000000, 0.6000000000, 0.6000000000]) {
				translate(v = [0, 0, 2176.1000000000]) {
					linear_extrude(height = 100.0000000000) {
						polygon(paths = [[0, 1, 2, 3, 4, 5, 6, 7, 8, 9, 10, 11]], points = [[0, -85], [0, 85], [90, 85], [90, 590], [425, 590], [425, 85], [1850, 85], [1850, 580], [2245, 580], [2245, 85], [2760, 85], [2760, -85]]);
					}
				}
			}
			color(c = [0.9000000000, 0.6000000000, 0.6000000000]) {
				translate(v = [0, 0, 2176.1000000000]) {
					linear_extrude(height = 100.0000000000) {
						polygon(paths = [[0, 1, 2, 3]], points = [[145, 765], [145, 1615], [445, 1615], [445, 765]]);
					}
				}
			}
			color(c = [0.9000000000, 0.6000000000, 0.6000000000]) {
				translate(v = [0, 0, 2176.1000000000]) {
					linear_extrude(height = 100.0000000000) {
						polygon(paths = [[0, 1, 2, 3]], points = [[1480, 1645], [1480, 1955], [2175, 1955], [2175, 1645]]);
					}
				}
			}
			color(c = [0.9000000000, 0.6000000000, 0.6000000000]) {
				translate(v = [0, 0, 2176.1000000000]) {
					linear_extrude(height = 100.0000000000) {
						polygon(paths = [[0, 1, 2, 3, 4, 5, 6, 7]], points = [[2415, 255], [2415, 775], [2480, 775], [2480, 1580], [2350, 1580], [2350, 2365], [2655, 2365], [2655, 255]]);
					}
				}
			}
			color(c = [0.9000000000, 0.6000000000, 0.6000000000]) {
				translate(v = [0, 0, 2176.1000000000]) {
					linear_extrude(height = 100.0000000000) {
						polygon(paths = [[0, 1, 2, 3, 4, 5, 6, 7, 8, 9, 10, 11, 12, 13, 14, 15]], points = [[1115, 270], [1115, 610], [1320, 610], [1320, 1305], [1020, 1305], [1020, 2420], [1305, 2420], [1305, 1475], [1880, 1475], [1880, 1325], [2305, 1325], [2305, 945], [1490, 945], [1490, 415], [1285, 415], [1285, 270]]);
					}
				}
			}
			color(c = [0.9000000000, 0.6000000000, 0.6000000000]) {
				translate(v = [0, 0, 2176.1000000000]) {
					linear_extrude(height = 100.0000000000) {
						polygon(paths = [[0, 1, 2, 3, 4, 5, 6, 7, 8, 9, 10, 11, 12, 13]], points = [[595, 280], [595, 655], [615, 655], [615, 1785], [175, 1785], [175, 2445], [345, 2445], [345, 2015], [850, 2015], [850, 1135], [1150, 1135], [1150, 805], [835, 805], [835, 280]]);
					}
				}
			}
			color(c = [0.9000000000, 0.6000000000, 0.6000000000]) {
				translate(v = [0, 0, 2176.1000000000]) {
					linear_extrude(height = 100.0000000000) {
						polygon(paths = [[0, 1, 2, 3, 4, 5, 6, 7, 8, 9, 10, 11]], points = [[1485, 2165], [1485, 2635], [845, 2635], [845, 2185], [515, 2185], [515, 2635], [0, 2635], [0, 2805], [2760, 2805], [2760, 2635], [2170, 2635], [2170, 2165]]);
					}
				}
			}
			color(c = [0.5000000000, 0.5000000000, 0.5000000000]) {
				translate(v = [0, 0, 2276.1000000000]) {
					linear_extrude(height = 340.0000000000) {
						polygon(paths = [[0, 1, 2, 3]], points = [[145, -85], [145, 85], [315, 85], [315, -85]]);
					}
				}
			}
			color(c = [0.5000000000, 0.5000000000, 0.5000000000]) {
				translate(v = [0, 0, 2276.1000000000]) {
					linear_extrude(height = 340.0000000000) {
						polygon(paths = [[0, 1, 2, 3]], points = [[605, -85], [605, 85], [775, 85], [775, -85]]);
					}
				}
			}
			color(c = [0.5000000000, 0.5000000000, 0.5000000000]) {
				translate(v = [0, 0, 2276.1000000000]) {
					linear_extrude(height = 340.0000000000) {
						polygon(paths = [[0, 1, 2, 3]], points = [[1065, -85], [1065, 85], [1235, 85], [1235, -85]]);
					}
				}
			}
			color(c = [0.5000000000, 0.5000000000, 0.5000000000]) {
				translate(v = [0, 0, 2276.1000000000]) {
					linear_extrude(height = 340.0000000000) {
						polygon(paths = [[0, 1, 2, 3]], points = [[1525, -85], [1525, 85], [1695, 85], [1695, -85]]);
					}
				}
			}
			color(c = [0.5000000000, 0.5000000000, 0.5000000000]) {
				translate(v = [0, 0, 2276.1000000000]) {
					linear_extrude(height = 340.0000000000) {
						polygon(paths = [[0, 1, 2, 3]], points = [[1985, -85], [1985, 85], [2155, 85], [2155, -85]]);
					}
				}
			}
			color(c = [0.5000000000, 0.5000000000, 0.5000000000]) {
				translate(v = [0, 0, 2276.1000000000]) {
					linear_extrude(height = 340.0000000000) {
						polygon(paths = [[0, 1, 2, 3]], points = [[2445, -85], [2445, 85], [2615, 85], [2615, -85]]);
					}
				}
			}
			color(c = [0.5000000000, 0.5000000000, 0.5000000000]) {
				translate(v = [0, 0, 2276.1000000000]) {
					linear_extrude(height = 340.0000000000) {
						polygon(paths = [[0, 1, 2, 3]], points = [[145, 2635], [145, 2805], [315, 2805], [315, 2635]]);
					}
				}
			}
			color(c = [0.5000000000, 0.5000000000, 0.5000000000]) {
				translate(v = [0, 0, 2276.1000000000]) {
					linear_extrude(height = 340.0000000000) {
						polygon(paths = [[0, 1, 2, 3]], points = [[605, 2635], [605, 2805], [775, 2805], [775, 2635]]);
					}
				}
			}
			color(c = [0.5000000000, 0.5000000000, 0.5000000000]) {
				translate(v = [0, 0, 2276.1000000000]) {
					linear_extrude(height = 340.0000000000) {
						polygon(paths = [[0, 1, 2, 3]], points = [[1065, 2635], [1065, 2805], [1235, 2805], [1235, 2635]]);
					}
				}
			}
			color(c = [0.5000000000, 0.5000000000, 0.5000000000]) {
				translate(v = [0, 0, 2276.1000000000]) {
					linear_extrude(height = 340.0000000000) {
						polygon(paths = [[0, 1, 2, 3]], points = [[1525, 2635], [1525, 2805], [1695, 2805], [1695, 2635]]);
					}
				}
			}
			color(c = [0.5000000000, 0.5000000000, 0.5000000000]) {
				translate(v = [0, 0, 2276.1000000000]) {
					linear_extrude(height = 340.0000000000) {
						polygon(paths = [[0, 1, 2, 3]], points = [[1985, 2635], [1985, 2805], [2155, 2805], [2155, 2635]]);
					}
				}
			}
			color(c = [0.5000000000, 0.5000000000, 0.5000000000]) {
				translate(v = [0, 0, 2276.1000000000]) {
					linear_extrude(height = 340.0000000000) {
						polygon(paths = [[0, 1, 2, 3]], points = [[2445, 2635], [2445, 2805], [2615, 2805], [2615, 2635]]);
					}
				}
			}
			color(c = [0.3000000000, 0.3000000000, 1]) {
				translate(v = [0, 0, 2616.1000000000]) {
					linear_extrude(height = 360.0000000000) {
						polygon(paths = [[0, 1, 2, 3]], points = [[0, -240], [0, 240], [2760, 240], [2760, -240]]);
					}
				}
			}
			color(c = [0.3000000000, 0.3000000000, 1]) {
				translate(v = [0, 0, 2616.1000000000]) {
					linear_extrude(height = 360.0000000000) {
						polygon(paths = [[0, 1, 2, 3]], points = [[0, 2480], [0, 2960], [2760, 2960], [2760, 2480]]);
					}
				}
			}
		}
	}
}
